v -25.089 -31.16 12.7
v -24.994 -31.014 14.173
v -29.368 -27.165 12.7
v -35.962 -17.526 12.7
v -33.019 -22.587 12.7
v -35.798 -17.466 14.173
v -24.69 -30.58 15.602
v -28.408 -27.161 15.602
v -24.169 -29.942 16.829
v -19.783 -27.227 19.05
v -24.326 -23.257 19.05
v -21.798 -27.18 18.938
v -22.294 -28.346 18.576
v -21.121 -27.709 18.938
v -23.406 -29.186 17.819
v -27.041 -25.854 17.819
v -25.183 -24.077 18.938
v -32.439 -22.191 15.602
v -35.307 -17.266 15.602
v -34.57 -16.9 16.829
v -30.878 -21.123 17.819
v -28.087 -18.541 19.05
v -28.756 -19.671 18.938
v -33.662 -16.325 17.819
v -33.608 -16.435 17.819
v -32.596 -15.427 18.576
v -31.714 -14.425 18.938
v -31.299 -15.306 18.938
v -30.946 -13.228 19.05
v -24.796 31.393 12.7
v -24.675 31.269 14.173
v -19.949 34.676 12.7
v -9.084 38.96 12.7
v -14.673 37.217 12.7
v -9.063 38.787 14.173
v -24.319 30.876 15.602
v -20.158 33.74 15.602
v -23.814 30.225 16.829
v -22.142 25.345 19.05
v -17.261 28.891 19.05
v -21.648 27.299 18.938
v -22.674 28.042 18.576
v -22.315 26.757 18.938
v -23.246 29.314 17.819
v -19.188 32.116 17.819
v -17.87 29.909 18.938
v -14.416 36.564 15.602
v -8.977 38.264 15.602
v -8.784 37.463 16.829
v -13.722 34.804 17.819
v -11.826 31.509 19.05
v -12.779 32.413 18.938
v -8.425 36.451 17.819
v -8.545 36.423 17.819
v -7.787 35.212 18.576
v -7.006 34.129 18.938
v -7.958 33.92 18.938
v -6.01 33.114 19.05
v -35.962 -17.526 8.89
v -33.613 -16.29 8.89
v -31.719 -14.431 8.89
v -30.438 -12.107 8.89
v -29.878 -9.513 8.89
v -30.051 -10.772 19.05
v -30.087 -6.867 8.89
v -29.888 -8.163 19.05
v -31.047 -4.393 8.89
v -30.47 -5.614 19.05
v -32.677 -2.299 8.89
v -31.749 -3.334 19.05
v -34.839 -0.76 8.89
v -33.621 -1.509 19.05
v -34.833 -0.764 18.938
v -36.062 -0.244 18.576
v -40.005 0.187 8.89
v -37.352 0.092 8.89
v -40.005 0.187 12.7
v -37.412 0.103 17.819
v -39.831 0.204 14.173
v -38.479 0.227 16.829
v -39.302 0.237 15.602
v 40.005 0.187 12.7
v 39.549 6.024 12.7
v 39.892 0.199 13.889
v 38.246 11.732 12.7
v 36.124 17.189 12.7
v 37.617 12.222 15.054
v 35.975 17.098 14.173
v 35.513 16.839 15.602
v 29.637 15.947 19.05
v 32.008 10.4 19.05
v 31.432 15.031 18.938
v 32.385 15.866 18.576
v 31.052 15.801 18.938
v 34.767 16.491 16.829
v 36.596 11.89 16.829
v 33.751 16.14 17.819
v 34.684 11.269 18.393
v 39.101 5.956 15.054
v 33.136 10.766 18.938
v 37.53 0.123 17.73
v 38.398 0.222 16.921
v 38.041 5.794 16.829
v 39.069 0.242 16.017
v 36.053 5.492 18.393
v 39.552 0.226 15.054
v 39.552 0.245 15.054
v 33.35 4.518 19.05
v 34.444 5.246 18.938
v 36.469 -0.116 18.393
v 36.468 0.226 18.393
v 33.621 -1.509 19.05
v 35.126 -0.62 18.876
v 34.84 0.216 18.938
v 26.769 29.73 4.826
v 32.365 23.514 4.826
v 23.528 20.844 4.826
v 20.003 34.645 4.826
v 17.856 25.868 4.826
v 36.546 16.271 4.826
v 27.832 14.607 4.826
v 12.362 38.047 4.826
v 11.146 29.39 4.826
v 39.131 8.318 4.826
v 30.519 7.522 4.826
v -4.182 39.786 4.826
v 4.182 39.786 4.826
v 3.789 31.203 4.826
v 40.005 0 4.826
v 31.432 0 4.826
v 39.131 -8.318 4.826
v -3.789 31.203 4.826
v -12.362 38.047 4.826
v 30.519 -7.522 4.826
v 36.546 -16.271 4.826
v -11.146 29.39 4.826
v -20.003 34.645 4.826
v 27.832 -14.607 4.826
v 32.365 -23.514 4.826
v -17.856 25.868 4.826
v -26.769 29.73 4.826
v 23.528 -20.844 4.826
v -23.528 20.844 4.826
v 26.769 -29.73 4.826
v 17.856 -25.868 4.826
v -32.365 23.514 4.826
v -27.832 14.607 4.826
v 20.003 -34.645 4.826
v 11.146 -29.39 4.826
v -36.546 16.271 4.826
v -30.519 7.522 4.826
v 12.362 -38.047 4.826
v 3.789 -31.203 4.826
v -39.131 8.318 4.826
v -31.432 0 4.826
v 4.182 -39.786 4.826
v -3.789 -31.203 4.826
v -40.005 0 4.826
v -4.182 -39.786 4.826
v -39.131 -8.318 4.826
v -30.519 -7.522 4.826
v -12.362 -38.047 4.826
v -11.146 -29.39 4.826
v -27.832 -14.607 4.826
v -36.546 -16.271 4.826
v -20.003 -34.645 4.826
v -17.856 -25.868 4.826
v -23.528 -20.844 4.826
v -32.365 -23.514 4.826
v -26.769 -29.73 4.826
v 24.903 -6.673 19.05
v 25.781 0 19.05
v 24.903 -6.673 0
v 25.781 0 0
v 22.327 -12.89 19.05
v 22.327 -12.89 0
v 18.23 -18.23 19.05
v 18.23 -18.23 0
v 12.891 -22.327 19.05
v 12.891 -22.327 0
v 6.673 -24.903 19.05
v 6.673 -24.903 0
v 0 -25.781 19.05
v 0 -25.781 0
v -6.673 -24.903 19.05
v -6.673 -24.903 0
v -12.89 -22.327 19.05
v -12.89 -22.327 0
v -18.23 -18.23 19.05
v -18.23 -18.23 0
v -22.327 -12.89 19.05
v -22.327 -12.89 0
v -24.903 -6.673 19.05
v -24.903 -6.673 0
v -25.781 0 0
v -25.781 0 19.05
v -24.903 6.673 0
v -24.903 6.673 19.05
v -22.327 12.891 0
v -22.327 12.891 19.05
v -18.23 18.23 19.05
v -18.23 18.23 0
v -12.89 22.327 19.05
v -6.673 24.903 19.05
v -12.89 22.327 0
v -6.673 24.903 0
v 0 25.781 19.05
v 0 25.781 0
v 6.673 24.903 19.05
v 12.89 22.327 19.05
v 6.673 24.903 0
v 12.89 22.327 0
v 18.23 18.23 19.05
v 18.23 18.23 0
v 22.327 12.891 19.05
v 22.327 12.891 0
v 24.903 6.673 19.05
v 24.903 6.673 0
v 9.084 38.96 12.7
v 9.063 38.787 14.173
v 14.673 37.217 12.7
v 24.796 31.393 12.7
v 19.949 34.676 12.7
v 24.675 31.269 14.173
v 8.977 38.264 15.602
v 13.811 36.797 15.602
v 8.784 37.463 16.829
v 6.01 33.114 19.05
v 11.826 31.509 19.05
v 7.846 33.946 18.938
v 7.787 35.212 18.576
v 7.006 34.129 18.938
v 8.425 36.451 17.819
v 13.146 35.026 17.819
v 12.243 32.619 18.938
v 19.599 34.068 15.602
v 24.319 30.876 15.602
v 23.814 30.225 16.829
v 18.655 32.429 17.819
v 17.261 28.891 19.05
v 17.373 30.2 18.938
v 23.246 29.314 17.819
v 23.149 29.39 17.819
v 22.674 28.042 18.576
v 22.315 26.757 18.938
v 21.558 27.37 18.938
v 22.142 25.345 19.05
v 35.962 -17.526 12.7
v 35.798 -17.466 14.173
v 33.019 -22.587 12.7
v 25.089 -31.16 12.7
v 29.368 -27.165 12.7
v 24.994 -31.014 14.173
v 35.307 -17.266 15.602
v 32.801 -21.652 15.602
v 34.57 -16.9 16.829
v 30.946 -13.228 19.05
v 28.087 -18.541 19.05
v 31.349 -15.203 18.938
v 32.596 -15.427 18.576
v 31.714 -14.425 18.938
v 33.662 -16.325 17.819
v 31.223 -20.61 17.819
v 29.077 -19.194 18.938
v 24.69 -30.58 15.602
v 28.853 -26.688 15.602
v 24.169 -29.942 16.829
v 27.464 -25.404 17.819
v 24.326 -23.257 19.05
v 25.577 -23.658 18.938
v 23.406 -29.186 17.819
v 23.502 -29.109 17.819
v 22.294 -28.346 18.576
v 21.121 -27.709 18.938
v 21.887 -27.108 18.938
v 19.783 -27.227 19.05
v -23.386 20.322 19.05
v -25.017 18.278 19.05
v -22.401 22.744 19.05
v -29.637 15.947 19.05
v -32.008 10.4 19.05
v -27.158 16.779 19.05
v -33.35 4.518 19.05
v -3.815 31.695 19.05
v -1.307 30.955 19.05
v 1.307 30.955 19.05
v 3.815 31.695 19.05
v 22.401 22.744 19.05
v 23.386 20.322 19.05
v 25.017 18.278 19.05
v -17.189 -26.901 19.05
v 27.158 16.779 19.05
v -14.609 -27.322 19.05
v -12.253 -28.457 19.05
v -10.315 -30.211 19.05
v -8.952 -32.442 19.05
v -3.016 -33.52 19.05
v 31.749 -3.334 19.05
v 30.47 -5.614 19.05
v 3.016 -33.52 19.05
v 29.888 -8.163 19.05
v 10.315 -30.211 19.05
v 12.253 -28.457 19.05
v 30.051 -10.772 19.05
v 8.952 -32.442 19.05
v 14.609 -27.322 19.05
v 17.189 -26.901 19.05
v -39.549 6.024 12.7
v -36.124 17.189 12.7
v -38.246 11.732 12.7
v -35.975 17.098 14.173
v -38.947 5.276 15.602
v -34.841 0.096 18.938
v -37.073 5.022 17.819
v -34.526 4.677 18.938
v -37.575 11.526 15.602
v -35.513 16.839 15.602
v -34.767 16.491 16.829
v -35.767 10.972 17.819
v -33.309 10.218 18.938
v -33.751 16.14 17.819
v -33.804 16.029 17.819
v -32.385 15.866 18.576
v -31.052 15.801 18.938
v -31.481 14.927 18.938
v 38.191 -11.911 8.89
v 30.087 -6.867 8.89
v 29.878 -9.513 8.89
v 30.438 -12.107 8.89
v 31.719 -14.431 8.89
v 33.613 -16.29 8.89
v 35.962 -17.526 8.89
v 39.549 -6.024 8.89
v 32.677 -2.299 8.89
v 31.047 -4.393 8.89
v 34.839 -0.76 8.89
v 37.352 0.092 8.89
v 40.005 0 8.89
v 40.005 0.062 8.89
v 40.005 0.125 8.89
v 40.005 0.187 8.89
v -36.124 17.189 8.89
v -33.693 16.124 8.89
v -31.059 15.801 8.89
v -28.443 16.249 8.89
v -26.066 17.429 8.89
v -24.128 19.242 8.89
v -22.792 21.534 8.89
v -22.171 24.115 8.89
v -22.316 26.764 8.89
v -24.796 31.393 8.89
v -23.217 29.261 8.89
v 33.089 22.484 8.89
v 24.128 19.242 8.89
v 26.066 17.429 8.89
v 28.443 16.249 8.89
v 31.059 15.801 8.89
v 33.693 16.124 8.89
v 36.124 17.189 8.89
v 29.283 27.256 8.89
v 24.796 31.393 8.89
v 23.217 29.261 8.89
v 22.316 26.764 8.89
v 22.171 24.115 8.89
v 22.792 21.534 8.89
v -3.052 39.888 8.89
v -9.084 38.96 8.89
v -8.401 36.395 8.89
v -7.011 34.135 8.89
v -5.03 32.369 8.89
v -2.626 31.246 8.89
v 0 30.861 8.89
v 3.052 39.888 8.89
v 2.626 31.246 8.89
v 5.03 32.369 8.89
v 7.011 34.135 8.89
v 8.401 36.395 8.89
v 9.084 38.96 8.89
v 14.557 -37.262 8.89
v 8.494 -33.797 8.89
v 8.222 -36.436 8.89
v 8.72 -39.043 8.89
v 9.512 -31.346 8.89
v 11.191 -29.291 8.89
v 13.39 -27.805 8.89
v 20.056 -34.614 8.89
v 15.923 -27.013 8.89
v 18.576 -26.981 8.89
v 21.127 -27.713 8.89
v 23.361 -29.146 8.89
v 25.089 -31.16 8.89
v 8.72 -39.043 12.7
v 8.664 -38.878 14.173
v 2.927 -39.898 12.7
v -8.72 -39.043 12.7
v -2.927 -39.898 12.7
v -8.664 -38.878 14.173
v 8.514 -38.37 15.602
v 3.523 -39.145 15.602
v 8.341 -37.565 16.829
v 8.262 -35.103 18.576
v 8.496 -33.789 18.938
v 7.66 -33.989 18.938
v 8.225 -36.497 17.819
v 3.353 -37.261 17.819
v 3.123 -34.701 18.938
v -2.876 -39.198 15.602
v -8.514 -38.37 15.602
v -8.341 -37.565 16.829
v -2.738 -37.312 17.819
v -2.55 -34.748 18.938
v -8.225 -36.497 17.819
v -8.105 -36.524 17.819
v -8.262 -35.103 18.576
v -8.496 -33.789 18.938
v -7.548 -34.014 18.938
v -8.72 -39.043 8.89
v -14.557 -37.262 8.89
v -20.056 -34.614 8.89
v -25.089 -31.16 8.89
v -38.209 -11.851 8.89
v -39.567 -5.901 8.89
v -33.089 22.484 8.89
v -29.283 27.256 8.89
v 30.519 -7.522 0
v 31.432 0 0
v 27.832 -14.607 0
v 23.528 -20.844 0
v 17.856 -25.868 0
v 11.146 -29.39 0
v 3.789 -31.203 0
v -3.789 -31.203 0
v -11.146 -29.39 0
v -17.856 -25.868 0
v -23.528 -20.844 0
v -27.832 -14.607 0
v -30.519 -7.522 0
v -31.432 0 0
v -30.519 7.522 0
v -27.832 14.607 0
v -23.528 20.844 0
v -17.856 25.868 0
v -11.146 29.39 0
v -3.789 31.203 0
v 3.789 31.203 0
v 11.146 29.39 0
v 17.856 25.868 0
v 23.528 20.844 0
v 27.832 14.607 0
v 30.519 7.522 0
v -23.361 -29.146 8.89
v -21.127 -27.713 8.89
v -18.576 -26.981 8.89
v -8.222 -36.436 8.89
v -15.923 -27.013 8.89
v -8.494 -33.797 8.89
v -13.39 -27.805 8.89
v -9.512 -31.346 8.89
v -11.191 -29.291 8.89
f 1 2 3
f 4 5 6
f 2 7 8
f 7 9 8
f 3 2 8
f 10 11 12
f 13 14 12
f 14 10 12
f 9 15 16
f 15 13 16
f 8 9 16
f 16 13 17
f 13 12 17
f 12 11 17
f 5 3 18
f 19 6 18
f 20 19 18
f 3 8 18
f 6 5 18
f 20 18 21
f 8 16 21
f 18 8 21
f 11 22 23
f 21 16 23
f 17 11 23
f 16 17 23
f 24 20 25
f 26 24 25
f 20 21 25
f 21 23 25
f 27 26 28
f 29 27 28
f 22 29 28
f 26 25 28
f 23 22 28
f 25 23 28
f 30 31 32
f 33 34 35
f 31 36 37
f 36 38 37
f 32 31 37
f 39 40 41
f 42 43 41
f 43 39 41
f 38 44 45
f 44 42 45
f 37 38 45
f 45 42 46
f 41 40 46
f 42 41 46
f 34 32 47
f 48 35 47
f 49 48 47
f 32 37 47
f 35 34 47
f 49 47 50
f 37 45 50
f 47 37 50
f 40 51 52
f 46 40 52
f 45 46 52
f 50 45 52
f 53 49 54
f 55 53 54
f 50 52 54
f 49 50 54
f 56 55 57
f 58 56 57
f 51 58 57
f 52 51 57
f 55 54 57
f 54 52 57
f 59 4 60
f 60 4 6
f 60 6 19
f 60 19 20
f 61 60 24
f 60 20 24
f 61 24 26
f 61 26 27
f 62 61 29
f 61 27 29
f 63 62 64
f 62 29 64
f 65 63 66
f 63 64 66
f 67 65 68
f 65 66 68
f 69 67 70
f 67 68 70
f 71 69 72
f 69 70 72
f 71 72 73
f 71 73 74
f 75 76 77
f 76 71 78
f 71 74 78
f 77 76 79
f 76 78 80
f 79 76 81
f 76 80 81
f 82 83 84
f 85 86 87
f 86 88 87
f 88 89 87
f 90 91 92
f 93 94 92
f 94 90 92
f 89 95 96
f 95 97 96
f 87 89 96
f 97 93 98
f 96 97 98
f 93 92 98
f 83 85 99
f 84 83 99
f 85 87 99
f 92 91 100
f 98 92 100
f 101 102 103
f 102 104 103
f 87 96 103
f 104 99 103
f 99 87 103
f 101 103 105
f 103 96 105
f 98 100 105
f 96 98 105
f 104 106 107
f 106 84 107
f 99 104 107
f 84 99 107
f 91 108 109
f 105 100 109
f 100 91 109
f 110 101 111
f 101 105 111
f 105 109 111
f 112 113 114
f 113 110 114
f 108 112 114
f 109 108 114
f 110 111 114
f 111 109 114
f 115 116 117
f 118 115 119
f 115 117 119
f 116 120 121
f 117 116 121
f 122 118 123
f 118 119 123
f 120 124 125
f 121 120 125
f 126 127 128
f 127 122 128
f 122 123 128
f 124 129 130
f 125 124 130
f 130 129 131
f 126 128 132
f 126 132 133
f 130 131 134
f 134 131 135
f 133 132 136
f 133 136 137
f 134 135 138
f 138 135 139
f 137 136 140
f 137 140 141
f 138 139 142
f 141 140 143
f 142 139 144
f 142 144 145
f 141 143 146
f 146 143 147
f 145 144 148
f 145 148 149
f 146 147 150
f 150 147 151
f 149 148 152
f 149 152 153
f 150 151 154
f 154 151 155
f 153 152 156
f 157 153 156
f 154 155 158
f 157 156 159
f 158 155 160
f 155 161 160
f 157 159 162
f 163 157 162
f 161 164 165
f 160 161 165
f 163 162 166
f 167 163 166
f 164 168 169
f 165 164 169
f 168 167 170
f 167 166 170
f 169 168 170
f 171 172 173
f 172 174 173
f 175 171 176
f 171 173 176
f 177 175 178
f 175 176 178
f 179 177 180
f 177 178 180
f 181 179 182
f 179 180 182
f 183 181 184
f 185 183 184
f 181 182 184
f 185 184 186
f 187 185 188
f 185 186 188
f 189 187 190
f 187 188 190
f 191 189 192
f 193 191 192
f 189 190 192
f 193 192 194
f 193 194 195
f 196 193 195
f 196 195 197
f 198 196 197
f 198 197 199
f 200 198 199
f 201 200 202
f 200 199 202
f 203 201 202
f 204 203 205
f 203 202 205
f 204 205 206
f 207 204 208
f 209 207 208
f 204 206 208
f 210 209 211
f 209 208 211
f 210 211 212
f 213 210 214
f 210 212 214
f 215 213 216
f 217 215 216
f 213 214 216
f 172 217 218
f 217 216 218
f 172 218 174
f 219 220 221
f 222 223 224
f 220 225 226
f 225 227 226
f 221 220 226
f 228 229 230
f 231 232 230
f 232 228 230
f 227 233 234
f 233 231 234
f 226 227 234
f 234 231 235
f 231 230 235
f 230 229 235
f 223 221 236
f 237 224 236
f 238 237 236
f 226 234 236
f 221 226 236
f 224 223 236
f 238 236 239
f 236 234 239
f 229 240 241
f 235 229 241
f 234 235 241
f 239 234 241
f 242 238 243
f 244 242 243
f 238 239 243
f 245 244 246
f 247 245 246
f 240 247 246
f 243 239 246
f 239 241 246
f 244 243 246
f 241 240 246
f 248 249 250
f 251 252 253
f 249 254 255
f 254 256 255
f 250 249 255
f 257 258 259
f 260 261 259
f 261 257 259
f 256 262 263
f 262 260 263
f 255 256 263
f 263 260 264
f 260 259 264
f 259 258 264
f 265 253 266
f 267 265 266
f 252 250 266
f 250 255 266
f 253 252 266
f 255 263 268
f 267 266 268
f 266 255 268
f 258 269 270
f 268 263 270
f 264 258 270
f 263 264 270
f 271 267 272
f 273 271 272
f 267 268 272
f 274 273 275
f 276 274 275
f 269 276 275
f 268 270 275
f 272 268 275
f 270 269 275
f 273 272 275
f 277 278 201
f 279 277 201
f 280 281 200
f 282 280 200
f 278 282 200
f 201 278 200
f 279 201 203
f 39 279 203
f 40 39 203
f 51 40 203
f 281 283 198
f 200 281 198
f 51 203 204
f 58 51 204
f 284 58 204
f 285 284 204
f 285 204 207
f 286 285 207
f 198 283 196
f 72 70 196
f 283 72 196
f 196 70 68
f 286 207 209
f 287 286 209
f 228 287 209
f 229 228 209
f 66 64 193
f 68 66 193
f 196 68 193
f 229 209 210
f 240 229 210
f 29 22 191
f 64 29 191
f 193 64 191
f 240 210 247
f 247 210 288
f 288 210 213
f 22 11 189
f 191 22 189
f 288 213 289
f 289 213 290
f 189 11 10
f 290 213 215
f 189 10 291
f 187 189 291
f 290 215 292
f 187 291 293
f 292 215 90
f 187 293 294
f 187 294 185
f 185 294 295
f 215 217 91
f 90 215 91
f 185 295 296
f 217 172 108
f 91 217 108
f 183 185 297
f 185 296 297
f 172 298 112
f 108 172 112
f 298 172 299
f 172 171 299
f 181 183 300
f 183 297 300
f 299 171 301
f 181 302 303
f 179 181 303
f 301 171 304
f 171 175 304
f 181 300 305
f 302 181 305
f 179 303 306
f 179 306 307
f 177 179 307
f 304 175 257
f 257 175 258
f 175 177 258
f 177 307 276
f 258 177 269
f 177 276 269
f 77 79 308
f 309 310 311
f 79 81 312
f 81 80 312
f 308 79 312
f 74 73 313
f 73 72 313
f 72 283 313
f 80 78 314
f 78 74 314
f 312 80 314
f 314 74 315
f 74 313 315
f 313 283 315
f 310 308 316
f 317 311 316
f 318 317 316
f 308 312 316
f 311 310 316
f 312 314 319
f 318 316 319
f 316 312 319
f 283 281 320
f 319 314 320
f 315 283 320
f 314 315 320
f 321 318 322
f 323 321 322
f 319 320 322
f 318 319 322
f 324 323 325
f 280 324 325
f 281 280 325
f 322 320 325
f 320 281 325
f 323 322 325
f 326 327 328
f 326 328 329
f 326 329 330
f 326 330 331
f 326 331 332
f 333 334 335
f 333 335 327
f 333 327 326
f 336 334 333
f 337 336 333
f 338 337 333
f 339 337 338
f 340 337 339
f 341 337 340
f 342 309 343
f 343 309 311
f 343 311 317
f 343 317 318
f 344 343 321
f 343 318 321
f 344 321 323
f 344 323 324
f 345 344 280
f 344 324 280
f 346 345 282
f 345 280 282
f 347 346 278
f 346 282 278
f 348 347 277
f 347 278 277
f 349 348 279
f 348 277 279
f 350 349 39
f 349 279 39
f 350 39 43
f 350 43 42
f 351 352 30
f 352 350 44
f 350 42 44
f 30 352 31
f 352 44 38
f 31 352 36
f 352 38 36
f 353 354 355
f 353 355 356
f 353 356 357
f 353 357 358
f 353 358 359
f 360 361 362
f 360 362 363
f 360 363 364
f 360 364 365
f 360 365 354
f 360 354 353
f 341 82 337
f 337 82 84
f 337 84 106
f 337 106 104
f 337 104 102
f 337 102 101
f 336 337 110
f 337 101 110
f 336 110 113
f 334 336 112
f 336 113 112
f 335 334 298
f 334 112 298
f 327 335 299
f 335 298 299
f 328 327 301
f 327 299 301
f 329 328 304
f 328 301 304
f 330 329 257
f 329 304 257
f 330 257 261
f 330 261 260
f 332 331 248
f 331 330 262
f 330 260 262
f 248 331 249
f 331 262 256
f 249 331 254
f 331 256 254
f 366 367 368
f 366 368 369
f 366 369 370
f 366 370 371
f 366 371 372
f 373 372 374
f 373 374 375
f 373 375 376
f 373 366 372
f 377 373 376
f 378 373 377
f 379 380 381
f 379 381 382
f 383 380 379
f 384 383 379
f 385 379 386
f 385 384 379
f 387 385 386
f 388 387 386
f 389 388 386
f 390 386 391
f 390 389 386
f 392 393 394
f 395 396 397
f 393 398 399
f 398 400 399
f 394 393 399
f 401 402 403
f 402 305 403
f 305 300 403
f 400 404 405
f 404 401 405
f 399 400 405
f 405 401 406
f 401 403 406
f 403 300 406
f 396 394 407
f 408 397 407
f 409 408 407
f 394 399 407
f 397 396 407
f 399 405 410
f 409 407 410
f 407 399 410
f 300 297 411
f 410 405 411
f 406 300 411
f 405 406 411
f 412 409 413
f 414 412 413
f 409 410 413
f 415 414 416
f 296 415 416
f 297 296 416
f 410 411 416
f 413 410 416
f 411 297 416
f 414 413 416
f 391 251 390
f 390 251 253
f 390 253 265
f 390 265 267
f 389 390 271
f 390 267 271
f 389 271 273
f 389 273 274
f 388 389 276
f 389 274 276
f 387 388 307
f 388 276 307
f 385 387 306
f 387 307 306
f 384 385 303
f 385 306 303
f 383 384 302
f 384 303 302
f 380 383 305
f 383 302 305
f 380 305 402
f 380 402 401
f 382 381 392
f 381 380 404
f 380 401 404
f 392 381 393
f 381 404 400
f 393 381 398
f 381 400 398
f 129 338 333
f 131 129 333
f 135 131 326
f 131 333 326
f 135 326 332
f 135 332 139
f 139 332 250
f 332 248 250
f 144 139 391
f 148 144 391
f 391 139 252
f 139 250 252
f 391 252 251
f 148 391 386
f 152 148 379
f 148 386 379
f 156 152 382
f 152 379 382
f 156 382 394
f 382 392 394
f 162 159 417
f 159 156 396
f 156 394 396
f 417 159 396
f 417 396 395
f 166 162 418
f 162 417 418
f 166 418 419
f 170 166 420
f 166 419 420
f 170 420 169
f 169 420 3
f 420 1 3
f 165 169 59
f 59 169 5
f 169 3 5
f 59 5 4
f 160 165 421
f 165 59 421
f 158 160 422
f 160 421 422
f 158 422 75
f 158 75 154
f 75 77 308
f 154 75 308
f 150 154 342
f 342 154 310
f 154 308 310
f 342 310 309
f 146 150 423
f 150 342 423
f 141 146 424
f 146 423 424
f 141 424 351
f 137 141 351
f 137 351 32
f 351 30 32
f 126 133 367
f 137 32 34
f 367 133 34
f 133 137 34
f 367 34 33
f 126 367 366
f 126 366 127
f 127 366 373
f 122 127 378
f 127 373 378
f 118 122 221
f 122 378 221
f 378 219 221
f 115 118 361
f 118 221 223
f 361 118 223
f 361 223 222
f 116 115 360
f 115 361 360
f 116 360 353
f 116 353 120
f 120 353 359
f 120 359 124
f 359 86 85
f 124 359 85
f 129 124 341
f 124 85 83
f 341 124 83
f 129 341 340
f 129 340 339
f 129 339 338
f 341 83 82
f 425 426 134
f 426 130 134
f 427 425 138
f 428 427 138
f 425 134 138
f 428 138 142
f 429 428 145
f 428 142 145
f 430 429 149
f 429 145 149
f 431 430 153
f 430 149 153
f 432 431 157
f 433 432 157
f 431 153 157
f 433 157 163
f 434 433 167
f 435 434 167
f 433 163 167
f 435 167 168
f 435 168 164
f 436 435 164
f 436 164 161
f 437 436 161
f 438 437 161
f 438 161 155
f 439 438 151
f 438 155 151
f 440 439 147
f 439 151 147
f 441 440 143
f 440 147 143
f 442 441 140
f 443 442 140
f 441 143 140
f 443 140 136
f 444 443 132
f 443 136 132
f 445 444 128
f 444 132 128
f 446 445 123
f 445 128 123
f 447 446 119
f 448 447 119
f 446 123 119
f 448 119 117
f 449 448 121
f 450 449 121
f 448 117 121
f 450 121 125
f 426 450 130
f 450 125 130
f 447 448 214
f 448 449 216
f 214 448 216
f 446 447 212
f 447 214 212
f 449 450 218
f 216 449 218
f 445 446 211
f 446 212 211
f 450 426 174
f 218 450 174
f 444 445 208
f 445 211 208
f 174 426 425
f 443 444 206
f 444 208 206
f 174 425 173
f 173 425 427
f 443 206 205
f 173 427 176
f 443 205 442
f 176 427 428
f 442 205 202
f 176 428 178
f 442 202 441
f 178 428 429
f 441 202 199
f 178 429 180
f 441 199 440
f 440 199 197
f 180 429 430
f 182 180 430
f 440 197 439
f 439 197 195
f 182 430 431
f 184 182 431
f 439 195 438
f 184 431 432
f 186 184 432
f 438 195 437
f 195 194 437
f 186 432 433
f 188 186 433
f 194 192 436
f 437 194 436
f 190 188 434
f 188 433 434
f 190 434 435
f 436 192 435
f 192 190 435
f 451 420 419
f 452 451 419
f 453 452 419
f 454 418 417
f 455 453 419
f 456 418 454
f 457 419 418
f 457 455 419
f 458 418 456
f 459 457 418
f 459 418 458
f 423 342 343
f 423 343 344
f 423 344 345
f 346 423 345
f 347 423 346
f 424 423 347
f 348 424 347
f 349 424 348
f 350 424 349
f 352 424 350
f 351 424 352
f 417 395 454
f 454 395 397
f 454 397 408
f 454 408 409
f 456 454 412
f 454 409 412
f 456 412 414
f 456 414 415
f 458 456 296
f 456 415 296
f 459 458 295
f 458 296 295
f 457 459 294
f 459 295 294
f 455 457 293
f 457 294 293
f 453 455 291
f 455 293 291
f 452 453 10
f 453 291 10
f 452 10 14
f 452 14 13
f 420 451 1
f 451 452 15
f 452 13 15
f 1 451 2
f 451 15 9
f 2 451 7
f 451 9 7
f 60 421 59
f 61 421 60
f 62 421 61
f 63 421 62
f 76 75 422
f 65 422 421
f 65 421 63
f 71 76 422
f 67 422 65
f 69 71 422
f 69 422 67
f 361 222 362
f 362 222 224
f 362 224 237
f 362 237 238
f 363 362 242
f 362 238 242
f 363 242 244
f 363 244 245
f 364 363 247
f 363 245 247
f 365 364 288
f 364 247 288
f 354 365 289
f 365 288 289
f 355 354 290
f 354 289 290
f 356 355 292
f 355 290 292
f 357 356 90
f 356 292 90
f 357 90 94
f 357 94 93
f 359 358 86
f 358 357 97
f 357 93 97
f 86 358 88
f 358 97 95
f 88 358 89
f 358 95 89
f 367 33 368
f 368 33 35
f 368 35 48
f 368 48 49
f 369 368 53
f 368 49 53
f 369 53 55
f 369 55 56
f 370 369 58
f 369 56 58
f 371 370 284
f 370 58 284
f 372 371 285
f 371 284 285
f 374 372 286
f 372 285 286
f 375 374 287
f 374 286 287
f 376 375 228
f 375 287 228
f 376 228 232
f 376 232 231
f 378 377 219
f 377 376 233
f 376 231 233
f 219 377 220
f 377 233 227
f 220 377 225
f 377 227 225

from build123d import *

# Parameters (mm, degrees)
F4_DEPTH = 10.16


with BuildPart() as f1:
    # F0 (on Front) → F1 (revolve)
    with BuildSketch(Plane.XZ):
        with BuildLine():
            Line((25.781, 19.05), (25.781, 0))
            Line((25.781, 0), (31.4325, 0))
            Line((31.4325, 0), (31.4325, 4.826))
            Line((31.4325, 4.826), (40.005, 4.826))
            Line((40.005, 4.826), (40.005, 12.7))
            ThreePointArc((40.005, 12.7), (38.1451280605, 17.1901280605), (33.655, 19.05))
            Line((33.655, 19.05), (25.781, 19.05))
        make_face()
    revolve(axis=Axis((0, 0, 5.4042546308), (0, 0, -1)))

    # F3 (on offset) → F4 (cut)
    with BuildSketch(Plane.XY.offset(19.05)):
        with BuildLine():
            ThreePointArc((9.084087807, 38.9599714286), (0, 40.005), (-9.084087807, 38.9599714286))
            ThreePointArc((-9.084087807, 38.9599714286), (0, 30.861), (9.084087807, 38.9599714286))
        make_face()
        with BuildLine():
            ThreePointArc((-36.1239683258, 17.1889190294), (-24.1281013804, 19.2415187752), (-24.7962961121, 31.3933707034))
            ThreePointArc((-24.7962961121, 31.3933707034), (-31.2771684561, 24.9427095234), (-36.1239683258, 17.1889190294))
        make_face()
        with BuildLine():
            ThreePointArc((-35.9617639006, -17.5257399889), (-30.0872502978, -6.8672185428), (-40.0045633065, 0.1869215305))
            ThreePointArc((-40.0045633065, 0.1869215305), (-39.0019911268, -8.9019499629), (-35.9617639006, -17.5257399889))
        make_face()
        with BuildLine():
            ThreePointArc((-8.719617772, -39.0431593357), (-13.3900860729, -27.8048002323), (-25.0885783867, -31.1602833673))
            ThreePointArc((-25.0885783867, -31.1602833673), (-17.3575189834, -36.0432595604), (-8.719617772, -39.0431593357))
        make_face()
        with BuildLine():
            ThreePointArc((25.0885783867, -31.1602833673), (13.3900860729, -27.8048002323), (8.719617772, -39.0431593357))
            ThreePointArc((8.719617772, -39.0431593357), (17.3575189834, -36.0432595604), (25.0885783867, -31.1602833673))
        make_face()
        with BuildLine():
            ThreePointArc((40.0045633065, 0.1869215305), (30.0872502978, -6.8672185428), (35.9617639006, -17.5257399889))
            ThreePointArc((35.9617639006, -17.5257399889), (39.0019911268, -8.9019499629), (40.0045633065, 0.1869215305))
        make_face()
        with BuildLine():
            ThreePointArc((24.7962961121, 31.3933707034), (24.1281013804, 19.2415187752), (36.1239683258, 17.1889190294))
            ThreePointArc((36.1239683258, 17.1889190294), (31.2771684561, 24.9427095234), (24.7962961121, 31.3933707034))
        make_face()
    extrude(amount=-F4_DEPTH, mode=Mode.SUBTRACT)


solid = f1.part
